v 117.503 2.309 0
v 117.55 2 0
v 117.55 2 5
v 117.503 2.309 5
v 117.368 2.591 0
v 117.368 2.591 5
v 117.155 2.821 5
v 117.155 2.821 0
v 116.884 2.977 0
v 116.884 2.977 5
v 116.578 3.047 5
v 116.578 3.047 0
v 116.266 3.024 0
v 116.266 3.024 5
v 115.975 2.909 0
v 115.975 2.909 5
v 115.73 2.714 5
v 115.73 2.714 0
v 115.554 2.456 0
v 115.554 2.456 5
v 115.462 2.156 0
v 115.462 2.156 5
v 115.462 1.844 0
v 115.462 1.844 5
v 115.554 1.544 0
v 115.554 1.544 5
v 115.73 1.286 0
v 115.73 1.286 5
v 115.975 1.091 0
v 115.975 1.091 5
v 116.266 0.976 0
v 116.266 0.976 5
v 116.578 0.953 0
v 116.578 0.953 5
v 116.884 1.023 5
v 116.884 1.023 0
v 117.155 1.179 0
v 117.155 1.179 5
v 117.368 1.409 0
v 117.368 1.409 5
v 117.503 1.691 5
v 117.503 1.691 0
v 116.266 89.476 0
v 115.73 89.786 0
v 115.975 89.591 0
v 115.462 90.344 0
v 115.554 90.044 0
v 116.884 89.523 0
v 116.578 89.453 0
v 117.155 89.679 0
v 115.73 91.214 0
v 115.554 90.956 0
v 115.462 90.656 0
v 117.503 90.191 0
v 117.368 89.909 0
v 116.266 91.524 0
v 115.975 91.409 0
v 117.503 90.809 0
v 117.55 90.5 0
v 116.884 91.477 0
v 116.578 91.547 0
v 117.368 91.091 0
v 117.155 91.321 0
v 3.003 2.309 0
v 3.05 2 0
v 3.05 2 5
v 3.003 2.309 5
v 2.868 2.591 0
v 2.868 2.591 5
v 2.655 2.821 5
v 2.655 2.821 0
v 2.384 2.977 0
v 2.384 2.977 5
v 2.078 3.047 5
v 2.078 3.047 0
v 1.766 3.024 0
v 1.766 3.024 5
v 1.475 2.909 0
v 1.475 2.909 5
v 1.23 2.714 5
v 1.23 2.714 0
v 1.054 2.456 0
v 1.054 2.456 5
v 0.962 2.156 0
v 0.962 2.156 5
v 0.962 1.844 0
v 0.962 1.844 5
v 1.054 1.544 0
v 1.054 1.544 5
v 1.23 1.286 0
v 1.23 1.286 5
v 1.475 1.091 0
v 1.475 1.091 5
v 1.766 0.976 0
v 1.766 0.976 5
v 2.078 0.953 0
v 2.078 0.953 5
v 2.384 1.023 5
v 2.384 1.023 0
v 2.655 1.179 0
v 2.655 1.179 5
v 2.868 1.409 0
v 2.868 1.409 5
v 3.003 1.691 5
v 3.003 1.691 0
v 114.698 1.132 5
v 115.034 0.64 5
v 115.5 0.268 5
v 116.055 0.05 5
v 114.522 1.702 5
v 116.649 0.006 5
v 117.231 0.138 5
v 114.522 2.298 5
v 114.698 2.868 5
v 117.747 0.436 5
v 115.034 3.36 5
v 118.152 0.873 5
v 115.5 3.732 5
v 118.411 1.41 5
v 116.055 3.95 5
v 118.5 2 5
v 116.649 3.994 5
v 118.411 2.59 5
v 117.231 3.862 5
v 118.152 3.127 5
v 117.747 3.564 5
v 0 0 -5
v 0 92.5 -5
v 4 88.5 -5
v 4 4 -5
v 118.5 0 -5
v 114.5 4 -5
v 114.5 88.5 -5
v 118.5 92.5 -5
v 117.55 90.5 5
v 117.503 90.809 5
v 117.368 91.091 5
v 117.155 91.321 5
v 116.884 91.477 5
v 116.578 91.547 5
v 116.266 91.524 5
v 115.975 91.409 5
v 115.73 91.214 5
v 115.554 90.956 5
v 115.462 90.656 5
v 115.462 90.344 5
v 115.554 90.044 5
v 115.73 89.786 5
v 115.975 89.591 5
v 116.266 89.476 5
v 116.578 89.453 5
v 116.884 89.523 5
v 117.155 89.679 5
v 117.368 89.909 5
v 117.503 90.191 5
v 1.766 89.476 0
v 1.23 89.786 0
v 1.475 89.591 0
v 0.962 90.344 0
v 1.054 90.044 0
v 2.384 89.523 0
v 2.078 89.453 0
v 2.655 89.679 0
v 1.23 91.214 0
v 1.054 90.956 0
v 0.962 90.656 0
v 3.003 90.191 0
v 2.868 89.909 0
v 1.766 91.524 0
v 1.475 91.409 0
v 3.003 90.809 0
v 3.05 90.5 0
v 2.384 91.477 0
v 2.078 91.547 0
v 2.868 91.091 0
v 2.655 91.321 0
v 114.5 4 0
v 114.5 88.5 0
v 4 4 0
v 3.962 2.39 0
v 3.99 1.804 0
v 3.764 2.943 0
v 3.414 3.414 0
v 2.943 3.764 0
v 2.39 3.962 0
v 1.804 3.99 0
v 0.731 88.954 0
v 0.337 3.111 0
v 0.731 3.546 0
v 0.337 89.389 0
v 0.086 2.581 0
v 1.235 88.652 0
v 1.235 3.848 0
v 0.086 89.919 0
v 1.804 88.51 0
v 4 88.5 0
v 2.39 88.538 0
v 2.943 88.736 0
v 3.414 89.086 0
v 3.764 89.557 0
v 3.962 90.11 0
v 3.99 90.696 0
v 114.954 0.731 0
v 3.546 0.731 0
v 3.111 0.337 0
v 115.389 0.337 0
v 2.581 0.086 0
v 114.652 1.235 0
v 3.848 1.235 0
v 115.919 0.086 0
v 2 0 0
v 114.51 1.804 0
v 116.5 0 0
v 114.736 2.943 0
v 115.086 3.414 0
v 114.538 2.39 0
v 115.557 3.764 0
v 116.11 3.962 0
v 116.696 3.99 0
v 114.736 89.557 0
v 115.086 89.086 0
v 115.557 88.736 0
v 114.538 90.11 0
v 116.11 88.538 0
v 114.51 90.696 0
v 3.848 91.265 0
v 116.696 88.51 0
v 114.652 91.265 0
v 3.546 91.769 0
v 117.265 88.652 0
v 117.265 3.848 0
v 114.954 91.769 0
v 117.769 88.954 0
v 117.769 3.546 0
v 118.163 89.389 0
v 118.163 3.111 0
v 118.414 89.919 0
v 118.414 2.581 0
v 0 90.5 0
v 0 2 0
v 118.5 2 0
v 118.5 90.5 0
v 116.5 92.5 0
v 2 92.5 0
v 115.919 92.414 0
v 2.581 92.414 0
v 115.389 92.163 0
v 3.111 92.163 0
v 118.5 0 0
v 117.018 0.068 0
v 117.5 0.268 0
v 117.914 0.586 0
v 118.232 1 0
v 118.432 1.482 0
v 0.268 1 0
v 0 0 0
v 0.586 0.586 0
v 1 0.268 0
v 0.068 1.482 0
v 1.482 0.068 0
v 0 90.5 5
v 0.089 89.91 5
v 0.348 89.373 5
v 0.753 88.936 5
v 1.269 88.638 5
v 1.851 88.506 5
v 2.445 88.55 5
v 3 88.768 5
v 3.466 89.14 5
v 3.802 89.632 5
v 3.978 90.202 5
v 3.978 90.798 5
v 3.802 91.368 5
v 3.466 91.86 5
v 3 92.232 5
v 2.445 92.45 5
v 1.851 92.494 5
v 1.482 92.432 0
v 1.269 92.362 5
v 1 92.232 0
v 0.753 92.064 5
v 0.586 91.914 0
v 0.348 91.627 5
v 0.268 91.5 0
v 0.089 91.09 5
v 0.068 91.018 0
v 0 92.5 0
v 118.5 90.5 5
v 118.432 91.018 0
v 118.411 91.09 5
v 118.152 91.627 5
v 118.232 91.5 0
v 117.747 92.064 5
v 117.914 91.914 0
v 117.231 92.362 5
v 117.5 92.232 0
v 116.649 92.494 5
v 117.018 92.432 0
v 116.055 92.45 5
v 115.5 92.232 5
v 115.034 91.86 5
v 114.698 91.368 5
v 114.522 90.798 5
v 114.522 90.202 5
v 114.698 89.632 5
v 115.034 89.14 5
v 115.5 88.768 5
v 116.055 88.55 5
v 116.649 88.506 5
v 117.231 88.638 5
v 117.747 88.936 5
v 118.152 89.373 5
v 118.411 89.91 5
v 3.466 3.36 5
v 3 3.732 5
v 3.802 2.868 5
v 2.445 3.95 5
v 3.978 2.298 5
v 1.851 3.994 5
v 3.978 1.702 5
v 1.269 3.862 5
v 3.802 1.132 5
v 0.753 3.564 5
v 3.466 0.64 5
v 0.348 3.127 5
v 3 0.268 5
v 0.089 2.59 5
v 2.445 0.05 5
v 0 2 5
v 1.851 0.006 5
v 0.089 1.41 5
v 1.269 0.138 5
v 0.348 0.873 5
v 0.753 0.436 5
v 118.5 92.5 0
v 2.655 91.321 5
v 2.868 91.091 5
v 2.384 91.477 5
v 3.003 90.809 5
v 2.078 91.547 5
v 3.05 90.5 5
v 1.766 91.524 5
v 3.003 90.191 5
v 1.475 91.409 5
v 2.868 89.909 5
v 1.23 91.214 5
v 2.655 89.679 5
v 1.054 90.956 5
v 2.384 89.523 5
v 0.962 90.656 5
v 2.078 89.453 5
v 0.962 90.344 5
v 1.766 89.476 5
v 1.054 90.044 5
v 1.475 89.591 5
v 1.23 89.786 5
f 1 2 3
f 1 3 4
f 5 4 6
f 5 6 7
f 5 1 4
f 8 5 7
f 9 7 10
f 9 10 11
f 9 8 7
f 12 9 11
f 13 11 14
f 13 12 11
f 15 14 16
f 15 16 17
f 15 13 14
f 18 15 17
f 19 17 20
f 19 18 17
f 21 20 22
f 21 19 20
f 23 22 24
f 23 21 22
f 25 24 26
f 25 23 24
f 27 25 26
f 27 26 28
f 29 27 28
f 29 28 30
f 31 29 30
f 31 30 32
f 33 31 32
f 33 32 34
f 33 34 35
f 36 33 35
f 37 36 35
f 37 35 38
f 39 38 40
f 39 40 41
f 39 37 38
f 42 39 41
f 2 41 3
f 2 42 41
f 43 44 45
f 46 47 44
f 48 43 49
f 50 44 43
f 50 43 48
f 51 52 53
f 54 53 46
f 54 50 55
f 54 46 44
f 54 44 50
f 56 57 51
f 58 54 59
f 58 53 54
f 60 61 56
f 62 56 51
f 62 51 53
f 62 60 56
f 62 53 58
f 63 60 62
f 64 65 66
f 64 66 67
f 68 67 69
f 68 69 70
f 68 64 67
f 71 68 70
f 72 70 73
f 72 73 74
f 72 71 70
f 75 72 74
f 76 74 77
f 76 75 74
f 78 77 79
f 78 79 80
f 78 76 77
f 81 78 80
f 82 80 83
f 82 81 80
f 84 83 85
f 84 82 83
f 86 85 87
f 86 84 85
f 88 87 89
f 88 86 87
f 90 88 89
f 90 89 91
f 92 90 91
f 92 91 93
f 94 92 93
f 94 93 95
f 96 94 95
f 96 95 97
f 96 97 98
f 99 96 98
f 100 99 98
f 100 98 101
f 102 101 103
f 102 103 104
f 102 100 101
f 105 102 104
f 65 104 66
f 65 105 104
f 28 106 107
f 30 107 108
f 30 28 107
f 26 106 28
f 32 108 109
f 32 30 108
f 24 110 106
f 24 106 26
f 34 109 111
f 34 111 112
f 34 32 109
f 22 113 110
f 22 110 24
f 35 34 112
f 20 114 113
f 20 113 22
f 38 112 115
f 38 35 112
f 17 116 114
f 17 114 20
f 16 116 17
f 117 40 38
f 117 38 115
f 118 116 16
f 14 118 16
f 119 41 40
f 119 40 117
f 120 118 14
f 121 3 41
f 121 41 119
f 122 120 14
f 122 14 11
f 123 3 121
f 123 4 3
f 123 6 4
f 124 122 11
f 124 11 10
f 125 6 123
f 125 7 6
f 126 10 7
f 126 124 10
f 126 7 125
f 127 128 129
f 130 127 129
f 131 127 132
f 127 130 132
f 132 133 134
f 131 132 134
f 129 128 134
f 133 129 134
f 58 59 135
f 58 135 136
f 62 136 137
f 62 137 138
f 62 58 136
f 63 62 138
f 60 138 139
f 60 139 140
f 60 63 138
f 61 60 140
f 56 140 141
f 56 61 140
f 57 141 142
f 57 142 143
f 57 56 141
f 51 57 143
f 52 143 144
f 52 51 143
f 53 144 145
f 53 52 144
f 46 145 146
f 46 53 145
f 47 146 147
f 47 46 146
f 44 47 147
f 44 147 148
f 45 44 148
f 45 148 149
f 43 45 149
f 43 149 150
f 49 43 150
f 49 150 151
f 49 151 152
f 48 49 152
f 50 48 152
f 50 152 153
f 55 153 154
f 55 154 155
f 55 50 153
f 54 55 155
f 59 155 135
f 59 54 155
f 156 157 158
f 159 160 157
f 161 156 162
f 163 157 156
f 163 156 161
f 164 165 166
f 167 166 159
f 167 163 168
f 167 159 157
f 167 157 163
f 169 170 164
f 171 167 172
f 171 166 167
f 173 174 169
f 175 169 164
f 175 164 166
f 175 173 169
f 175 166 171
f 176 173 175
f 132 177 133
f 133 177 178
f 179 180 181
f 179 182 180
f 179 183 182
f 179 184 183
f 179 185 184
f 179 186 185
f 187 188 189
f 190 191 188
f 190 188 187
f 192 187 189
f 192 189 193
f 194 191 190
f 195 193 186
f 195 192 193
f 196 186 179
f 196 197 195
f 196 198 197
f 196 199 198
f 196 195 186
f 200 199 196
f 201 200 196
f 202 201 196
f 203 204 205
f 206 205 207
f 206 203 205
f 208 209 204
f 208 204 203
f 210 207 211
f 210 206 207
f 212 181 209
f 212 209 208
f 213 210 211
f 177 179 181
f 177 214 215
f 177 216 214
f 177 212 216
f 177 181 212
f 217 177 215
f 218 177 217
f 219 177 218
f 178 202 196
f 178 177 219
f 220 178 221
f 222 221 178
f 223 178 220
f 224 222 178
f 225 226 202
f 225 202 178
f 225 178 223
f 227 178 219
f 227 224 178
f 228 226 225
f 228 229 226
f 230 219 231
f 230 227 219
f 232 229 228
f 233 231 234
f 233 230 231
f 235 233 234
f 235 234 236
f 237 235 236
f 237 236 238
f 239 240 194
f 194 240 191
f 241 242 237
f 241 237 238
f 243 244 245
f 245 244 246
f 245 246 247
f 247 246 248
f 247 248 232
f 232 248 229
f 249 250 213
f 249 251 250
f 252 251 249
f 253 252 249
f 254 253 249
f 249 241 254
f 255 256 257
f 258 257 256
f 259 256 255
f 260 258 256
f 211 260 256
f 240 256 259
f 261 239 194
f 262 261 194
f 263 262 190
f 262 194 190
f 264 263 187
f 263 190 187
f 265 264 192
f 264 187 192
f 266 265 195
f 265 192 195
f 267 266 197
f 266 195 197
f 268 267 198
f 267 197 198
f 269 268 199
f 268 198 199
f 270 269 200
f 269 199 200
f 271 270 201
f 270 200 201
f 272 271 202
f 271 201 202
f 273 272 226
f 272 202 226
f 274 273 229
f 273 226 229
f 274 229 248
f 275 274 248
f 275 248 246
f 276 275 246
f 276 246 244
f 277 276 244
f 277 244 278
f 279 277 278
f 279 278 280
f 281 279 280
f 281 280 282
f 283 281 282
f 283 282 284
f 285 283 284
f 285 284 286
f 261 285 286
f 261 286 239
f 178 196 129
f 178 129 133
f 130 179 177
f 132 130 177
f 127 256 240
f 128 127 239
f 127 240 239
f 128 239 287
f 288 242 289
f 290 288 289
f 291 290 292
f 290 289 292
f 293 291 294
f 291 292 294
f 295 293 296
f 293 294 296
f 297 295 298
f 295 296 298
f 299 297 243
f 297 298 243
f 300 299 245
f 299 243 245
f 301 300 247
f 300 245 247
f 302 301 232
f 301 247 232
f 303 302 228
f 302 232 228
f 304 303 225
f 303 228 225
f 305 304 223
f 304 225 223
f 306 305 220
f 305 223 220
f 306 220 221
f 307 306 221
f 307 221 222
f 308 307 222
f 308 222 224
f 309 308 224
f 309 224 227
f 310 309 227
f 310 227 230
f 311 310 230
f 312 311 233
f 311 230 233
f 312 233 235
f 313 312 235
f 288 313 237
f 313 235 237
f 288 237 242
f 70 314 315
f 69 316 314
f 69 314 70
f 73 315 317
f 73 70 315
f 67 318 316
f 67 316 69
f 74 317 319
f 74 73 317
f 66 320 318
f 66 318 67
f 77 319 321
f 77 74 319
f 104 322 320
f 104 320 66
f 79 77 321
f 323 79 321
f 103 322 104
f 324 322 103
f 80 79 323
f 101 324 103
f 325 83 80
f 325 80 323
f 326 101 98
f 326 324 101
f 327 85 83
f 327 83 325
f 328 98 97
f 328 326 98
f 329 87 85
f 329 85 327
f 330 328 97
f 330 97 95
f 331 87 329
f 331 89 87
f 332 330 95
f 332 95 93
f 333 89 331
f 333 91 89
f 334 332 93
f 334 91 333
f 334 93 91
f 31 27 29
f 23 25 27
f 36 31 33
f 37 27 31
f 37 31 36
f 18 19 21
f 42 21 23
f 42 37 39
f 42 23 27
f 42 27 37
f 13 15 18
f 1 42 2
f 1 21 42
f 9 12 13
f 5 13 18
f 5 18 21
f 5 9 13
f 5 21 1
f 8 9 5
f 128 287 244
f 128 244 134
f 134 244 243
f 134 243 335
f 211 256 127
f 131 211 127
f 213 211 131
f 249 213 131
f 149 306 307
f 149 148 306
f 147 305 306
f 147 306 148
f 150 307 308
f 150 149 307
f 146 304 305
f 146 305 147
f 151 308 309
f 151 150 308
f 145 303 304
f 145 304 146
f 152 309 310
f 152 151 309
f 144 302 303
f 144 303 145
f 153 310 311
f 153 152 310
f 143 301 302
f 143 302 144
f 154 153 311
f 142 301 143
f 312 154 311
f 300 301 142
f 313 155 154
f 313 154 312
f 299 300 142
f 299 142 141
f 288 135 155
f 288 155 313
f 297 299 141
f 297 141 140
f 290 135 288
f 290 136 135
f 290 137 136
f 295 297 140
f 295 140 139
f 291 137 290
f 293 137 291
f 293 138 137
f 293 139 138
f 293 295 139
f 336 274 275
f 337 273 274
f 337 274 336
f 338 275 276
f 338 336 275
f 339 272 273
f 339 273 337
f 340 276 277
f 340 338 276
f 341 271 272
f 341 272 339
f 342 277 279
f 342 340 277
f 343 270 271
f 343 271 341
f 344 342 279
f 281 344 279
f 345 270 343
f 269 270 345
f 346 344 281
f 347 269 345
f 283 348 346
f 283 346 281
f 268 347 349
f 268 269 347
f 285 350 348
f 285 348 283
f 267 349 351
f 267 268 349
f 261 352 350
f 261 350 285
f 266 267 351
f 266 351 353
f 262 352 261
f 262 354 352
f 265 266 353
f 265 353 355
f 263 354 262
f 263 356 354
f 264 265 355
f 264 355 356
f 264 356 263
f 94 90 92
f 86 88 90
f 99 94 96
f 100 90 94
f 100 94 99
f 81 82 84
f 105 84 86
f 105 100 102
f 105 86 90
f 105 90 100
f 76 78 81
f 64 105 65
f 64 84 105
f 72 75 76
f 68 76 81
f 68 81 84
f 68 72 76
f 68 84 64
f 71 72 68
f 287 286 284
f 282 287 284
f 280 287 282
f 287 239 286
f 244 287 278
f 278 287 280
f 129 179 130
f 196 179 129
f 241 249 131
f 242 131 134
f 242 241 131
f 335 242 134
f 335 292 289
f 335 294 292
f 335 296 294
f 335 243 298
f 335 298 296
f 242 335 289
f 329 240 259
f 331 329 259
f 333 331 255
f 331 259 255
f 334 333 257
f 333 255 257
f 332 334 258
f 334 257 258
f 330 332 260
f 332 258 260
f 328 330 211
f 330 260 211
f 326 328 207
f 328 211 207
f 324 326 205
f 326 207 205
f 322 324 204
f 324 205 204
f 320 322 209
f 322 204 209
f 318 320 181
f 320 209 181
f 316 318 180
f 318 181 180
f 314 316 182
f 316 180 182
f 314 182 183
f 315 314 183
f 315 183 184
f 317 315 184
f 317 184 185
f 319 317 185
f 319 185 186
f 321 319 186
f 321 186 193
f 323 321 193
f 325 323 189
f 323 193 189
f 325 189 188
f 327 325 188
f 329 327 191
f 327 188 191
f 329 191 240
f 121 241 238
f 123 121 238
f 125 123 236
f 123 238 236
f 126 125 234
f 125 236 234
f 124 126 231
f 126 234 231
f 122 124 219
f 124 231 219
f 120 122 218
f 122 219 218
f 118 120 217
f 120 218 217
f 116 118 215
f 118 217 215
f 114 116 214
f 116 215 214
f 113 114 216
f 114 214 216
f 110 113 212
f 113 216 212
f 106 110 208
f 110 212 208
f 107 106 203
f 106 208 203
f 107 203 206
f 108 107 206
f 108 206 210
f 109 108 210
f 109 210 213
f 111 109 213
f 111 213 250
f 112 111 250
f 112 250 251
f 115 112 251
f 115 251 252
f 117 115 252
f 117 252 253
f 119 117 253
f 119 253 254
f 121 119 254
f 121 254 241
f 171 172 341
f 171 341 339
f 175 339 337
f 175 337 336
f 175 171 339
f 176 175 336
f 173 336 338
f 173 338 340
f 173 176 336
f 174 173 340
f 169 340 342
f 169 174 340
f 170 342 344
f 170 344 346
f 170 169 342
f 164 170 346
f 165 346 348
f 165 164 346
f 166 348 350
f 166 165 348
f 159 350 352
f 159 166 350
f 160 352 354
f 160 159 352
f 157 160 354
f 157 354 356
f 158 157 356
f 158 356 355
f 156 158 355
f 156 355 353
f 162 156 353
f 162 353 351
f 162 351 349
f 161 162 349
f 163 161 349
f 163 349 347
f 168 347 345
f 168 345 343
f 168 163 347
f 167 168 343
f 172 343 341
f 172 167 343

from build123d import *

# Parameters (mm, degrees)
SKETCH1_W           = 118.5
SKETCH1_H           = 92.5
SKETCH1_W_2         = 110.5
SKETCH1_H_2         = 84.5
BOSS_EXTRUDE1_DEPTH = 5
SKETCH2_R           = 2
SKETCH2_R_2         = 1.05
BOSS_EXTRUDE2_DEPTH = 5


with BuildPart() as part:
    # Sketch1 → Boss-Extrude1 (new body)
    with BuildSketch(Plane.XY):
        with Locations((59.25, 46.25)):
            Rectangle(SKETCH1_W, SKETCH1_H)
        with Locations((59.25, 46.25)):
            Rectangle(SKETCH1_W_2, SKETCH1_H_2, mode=Mode.SUBTRACT)
    extrude(amount=-BOSS_EXTRUDE1_DEPTH)

    # Sketch2 → Boss-Extrude2 (add)
    # profile 1 of 4: a face of its own
    with BuildSketch(Plane.XY):
        with Locations(Location((2, 90.5, 0), (0, 0, 180))):
            Circle(SKETCH2_R)
        with Locations((2, 90.5)):
            Circle(SKETCH2_R_2, mode=Mode.SUBTRACT)
    # profile 2 of 4: a face of its own
    with BuildSketch(Plane.XY):
        with Locations((116.5, 90.5)):
            Circle(SKETCH2_R)
        with Locations((116.5, 90.5)):
            Circle(SKETCH2_R_2, mode=Mode.SUBTRACT)
    # profile 3 of 4: a face of its own
    with BuildSketch(Plane.XY):
        with Locations((116.5, 2)):
            Circle(SKETCH2_R)
        with Locations((116.5, 2)):
            Circle(SKETCH2_R_2, mode=Mode.SUBTRACT)
    # profile 4 of 4: a face of its own
    with BuildSketch(Plane.XY):
        with Locations(Location((2, 2, 0), (0, 0, 180))):
            Circle(SKETCH2_R)
        with Locations((2, 2)):
            Circle(SKETCH2_R_2, mode=Mode.SUBTRACT)
    extrude(amount=BOSS_EXTRUDE2_DEPTH)


solid = part.part
